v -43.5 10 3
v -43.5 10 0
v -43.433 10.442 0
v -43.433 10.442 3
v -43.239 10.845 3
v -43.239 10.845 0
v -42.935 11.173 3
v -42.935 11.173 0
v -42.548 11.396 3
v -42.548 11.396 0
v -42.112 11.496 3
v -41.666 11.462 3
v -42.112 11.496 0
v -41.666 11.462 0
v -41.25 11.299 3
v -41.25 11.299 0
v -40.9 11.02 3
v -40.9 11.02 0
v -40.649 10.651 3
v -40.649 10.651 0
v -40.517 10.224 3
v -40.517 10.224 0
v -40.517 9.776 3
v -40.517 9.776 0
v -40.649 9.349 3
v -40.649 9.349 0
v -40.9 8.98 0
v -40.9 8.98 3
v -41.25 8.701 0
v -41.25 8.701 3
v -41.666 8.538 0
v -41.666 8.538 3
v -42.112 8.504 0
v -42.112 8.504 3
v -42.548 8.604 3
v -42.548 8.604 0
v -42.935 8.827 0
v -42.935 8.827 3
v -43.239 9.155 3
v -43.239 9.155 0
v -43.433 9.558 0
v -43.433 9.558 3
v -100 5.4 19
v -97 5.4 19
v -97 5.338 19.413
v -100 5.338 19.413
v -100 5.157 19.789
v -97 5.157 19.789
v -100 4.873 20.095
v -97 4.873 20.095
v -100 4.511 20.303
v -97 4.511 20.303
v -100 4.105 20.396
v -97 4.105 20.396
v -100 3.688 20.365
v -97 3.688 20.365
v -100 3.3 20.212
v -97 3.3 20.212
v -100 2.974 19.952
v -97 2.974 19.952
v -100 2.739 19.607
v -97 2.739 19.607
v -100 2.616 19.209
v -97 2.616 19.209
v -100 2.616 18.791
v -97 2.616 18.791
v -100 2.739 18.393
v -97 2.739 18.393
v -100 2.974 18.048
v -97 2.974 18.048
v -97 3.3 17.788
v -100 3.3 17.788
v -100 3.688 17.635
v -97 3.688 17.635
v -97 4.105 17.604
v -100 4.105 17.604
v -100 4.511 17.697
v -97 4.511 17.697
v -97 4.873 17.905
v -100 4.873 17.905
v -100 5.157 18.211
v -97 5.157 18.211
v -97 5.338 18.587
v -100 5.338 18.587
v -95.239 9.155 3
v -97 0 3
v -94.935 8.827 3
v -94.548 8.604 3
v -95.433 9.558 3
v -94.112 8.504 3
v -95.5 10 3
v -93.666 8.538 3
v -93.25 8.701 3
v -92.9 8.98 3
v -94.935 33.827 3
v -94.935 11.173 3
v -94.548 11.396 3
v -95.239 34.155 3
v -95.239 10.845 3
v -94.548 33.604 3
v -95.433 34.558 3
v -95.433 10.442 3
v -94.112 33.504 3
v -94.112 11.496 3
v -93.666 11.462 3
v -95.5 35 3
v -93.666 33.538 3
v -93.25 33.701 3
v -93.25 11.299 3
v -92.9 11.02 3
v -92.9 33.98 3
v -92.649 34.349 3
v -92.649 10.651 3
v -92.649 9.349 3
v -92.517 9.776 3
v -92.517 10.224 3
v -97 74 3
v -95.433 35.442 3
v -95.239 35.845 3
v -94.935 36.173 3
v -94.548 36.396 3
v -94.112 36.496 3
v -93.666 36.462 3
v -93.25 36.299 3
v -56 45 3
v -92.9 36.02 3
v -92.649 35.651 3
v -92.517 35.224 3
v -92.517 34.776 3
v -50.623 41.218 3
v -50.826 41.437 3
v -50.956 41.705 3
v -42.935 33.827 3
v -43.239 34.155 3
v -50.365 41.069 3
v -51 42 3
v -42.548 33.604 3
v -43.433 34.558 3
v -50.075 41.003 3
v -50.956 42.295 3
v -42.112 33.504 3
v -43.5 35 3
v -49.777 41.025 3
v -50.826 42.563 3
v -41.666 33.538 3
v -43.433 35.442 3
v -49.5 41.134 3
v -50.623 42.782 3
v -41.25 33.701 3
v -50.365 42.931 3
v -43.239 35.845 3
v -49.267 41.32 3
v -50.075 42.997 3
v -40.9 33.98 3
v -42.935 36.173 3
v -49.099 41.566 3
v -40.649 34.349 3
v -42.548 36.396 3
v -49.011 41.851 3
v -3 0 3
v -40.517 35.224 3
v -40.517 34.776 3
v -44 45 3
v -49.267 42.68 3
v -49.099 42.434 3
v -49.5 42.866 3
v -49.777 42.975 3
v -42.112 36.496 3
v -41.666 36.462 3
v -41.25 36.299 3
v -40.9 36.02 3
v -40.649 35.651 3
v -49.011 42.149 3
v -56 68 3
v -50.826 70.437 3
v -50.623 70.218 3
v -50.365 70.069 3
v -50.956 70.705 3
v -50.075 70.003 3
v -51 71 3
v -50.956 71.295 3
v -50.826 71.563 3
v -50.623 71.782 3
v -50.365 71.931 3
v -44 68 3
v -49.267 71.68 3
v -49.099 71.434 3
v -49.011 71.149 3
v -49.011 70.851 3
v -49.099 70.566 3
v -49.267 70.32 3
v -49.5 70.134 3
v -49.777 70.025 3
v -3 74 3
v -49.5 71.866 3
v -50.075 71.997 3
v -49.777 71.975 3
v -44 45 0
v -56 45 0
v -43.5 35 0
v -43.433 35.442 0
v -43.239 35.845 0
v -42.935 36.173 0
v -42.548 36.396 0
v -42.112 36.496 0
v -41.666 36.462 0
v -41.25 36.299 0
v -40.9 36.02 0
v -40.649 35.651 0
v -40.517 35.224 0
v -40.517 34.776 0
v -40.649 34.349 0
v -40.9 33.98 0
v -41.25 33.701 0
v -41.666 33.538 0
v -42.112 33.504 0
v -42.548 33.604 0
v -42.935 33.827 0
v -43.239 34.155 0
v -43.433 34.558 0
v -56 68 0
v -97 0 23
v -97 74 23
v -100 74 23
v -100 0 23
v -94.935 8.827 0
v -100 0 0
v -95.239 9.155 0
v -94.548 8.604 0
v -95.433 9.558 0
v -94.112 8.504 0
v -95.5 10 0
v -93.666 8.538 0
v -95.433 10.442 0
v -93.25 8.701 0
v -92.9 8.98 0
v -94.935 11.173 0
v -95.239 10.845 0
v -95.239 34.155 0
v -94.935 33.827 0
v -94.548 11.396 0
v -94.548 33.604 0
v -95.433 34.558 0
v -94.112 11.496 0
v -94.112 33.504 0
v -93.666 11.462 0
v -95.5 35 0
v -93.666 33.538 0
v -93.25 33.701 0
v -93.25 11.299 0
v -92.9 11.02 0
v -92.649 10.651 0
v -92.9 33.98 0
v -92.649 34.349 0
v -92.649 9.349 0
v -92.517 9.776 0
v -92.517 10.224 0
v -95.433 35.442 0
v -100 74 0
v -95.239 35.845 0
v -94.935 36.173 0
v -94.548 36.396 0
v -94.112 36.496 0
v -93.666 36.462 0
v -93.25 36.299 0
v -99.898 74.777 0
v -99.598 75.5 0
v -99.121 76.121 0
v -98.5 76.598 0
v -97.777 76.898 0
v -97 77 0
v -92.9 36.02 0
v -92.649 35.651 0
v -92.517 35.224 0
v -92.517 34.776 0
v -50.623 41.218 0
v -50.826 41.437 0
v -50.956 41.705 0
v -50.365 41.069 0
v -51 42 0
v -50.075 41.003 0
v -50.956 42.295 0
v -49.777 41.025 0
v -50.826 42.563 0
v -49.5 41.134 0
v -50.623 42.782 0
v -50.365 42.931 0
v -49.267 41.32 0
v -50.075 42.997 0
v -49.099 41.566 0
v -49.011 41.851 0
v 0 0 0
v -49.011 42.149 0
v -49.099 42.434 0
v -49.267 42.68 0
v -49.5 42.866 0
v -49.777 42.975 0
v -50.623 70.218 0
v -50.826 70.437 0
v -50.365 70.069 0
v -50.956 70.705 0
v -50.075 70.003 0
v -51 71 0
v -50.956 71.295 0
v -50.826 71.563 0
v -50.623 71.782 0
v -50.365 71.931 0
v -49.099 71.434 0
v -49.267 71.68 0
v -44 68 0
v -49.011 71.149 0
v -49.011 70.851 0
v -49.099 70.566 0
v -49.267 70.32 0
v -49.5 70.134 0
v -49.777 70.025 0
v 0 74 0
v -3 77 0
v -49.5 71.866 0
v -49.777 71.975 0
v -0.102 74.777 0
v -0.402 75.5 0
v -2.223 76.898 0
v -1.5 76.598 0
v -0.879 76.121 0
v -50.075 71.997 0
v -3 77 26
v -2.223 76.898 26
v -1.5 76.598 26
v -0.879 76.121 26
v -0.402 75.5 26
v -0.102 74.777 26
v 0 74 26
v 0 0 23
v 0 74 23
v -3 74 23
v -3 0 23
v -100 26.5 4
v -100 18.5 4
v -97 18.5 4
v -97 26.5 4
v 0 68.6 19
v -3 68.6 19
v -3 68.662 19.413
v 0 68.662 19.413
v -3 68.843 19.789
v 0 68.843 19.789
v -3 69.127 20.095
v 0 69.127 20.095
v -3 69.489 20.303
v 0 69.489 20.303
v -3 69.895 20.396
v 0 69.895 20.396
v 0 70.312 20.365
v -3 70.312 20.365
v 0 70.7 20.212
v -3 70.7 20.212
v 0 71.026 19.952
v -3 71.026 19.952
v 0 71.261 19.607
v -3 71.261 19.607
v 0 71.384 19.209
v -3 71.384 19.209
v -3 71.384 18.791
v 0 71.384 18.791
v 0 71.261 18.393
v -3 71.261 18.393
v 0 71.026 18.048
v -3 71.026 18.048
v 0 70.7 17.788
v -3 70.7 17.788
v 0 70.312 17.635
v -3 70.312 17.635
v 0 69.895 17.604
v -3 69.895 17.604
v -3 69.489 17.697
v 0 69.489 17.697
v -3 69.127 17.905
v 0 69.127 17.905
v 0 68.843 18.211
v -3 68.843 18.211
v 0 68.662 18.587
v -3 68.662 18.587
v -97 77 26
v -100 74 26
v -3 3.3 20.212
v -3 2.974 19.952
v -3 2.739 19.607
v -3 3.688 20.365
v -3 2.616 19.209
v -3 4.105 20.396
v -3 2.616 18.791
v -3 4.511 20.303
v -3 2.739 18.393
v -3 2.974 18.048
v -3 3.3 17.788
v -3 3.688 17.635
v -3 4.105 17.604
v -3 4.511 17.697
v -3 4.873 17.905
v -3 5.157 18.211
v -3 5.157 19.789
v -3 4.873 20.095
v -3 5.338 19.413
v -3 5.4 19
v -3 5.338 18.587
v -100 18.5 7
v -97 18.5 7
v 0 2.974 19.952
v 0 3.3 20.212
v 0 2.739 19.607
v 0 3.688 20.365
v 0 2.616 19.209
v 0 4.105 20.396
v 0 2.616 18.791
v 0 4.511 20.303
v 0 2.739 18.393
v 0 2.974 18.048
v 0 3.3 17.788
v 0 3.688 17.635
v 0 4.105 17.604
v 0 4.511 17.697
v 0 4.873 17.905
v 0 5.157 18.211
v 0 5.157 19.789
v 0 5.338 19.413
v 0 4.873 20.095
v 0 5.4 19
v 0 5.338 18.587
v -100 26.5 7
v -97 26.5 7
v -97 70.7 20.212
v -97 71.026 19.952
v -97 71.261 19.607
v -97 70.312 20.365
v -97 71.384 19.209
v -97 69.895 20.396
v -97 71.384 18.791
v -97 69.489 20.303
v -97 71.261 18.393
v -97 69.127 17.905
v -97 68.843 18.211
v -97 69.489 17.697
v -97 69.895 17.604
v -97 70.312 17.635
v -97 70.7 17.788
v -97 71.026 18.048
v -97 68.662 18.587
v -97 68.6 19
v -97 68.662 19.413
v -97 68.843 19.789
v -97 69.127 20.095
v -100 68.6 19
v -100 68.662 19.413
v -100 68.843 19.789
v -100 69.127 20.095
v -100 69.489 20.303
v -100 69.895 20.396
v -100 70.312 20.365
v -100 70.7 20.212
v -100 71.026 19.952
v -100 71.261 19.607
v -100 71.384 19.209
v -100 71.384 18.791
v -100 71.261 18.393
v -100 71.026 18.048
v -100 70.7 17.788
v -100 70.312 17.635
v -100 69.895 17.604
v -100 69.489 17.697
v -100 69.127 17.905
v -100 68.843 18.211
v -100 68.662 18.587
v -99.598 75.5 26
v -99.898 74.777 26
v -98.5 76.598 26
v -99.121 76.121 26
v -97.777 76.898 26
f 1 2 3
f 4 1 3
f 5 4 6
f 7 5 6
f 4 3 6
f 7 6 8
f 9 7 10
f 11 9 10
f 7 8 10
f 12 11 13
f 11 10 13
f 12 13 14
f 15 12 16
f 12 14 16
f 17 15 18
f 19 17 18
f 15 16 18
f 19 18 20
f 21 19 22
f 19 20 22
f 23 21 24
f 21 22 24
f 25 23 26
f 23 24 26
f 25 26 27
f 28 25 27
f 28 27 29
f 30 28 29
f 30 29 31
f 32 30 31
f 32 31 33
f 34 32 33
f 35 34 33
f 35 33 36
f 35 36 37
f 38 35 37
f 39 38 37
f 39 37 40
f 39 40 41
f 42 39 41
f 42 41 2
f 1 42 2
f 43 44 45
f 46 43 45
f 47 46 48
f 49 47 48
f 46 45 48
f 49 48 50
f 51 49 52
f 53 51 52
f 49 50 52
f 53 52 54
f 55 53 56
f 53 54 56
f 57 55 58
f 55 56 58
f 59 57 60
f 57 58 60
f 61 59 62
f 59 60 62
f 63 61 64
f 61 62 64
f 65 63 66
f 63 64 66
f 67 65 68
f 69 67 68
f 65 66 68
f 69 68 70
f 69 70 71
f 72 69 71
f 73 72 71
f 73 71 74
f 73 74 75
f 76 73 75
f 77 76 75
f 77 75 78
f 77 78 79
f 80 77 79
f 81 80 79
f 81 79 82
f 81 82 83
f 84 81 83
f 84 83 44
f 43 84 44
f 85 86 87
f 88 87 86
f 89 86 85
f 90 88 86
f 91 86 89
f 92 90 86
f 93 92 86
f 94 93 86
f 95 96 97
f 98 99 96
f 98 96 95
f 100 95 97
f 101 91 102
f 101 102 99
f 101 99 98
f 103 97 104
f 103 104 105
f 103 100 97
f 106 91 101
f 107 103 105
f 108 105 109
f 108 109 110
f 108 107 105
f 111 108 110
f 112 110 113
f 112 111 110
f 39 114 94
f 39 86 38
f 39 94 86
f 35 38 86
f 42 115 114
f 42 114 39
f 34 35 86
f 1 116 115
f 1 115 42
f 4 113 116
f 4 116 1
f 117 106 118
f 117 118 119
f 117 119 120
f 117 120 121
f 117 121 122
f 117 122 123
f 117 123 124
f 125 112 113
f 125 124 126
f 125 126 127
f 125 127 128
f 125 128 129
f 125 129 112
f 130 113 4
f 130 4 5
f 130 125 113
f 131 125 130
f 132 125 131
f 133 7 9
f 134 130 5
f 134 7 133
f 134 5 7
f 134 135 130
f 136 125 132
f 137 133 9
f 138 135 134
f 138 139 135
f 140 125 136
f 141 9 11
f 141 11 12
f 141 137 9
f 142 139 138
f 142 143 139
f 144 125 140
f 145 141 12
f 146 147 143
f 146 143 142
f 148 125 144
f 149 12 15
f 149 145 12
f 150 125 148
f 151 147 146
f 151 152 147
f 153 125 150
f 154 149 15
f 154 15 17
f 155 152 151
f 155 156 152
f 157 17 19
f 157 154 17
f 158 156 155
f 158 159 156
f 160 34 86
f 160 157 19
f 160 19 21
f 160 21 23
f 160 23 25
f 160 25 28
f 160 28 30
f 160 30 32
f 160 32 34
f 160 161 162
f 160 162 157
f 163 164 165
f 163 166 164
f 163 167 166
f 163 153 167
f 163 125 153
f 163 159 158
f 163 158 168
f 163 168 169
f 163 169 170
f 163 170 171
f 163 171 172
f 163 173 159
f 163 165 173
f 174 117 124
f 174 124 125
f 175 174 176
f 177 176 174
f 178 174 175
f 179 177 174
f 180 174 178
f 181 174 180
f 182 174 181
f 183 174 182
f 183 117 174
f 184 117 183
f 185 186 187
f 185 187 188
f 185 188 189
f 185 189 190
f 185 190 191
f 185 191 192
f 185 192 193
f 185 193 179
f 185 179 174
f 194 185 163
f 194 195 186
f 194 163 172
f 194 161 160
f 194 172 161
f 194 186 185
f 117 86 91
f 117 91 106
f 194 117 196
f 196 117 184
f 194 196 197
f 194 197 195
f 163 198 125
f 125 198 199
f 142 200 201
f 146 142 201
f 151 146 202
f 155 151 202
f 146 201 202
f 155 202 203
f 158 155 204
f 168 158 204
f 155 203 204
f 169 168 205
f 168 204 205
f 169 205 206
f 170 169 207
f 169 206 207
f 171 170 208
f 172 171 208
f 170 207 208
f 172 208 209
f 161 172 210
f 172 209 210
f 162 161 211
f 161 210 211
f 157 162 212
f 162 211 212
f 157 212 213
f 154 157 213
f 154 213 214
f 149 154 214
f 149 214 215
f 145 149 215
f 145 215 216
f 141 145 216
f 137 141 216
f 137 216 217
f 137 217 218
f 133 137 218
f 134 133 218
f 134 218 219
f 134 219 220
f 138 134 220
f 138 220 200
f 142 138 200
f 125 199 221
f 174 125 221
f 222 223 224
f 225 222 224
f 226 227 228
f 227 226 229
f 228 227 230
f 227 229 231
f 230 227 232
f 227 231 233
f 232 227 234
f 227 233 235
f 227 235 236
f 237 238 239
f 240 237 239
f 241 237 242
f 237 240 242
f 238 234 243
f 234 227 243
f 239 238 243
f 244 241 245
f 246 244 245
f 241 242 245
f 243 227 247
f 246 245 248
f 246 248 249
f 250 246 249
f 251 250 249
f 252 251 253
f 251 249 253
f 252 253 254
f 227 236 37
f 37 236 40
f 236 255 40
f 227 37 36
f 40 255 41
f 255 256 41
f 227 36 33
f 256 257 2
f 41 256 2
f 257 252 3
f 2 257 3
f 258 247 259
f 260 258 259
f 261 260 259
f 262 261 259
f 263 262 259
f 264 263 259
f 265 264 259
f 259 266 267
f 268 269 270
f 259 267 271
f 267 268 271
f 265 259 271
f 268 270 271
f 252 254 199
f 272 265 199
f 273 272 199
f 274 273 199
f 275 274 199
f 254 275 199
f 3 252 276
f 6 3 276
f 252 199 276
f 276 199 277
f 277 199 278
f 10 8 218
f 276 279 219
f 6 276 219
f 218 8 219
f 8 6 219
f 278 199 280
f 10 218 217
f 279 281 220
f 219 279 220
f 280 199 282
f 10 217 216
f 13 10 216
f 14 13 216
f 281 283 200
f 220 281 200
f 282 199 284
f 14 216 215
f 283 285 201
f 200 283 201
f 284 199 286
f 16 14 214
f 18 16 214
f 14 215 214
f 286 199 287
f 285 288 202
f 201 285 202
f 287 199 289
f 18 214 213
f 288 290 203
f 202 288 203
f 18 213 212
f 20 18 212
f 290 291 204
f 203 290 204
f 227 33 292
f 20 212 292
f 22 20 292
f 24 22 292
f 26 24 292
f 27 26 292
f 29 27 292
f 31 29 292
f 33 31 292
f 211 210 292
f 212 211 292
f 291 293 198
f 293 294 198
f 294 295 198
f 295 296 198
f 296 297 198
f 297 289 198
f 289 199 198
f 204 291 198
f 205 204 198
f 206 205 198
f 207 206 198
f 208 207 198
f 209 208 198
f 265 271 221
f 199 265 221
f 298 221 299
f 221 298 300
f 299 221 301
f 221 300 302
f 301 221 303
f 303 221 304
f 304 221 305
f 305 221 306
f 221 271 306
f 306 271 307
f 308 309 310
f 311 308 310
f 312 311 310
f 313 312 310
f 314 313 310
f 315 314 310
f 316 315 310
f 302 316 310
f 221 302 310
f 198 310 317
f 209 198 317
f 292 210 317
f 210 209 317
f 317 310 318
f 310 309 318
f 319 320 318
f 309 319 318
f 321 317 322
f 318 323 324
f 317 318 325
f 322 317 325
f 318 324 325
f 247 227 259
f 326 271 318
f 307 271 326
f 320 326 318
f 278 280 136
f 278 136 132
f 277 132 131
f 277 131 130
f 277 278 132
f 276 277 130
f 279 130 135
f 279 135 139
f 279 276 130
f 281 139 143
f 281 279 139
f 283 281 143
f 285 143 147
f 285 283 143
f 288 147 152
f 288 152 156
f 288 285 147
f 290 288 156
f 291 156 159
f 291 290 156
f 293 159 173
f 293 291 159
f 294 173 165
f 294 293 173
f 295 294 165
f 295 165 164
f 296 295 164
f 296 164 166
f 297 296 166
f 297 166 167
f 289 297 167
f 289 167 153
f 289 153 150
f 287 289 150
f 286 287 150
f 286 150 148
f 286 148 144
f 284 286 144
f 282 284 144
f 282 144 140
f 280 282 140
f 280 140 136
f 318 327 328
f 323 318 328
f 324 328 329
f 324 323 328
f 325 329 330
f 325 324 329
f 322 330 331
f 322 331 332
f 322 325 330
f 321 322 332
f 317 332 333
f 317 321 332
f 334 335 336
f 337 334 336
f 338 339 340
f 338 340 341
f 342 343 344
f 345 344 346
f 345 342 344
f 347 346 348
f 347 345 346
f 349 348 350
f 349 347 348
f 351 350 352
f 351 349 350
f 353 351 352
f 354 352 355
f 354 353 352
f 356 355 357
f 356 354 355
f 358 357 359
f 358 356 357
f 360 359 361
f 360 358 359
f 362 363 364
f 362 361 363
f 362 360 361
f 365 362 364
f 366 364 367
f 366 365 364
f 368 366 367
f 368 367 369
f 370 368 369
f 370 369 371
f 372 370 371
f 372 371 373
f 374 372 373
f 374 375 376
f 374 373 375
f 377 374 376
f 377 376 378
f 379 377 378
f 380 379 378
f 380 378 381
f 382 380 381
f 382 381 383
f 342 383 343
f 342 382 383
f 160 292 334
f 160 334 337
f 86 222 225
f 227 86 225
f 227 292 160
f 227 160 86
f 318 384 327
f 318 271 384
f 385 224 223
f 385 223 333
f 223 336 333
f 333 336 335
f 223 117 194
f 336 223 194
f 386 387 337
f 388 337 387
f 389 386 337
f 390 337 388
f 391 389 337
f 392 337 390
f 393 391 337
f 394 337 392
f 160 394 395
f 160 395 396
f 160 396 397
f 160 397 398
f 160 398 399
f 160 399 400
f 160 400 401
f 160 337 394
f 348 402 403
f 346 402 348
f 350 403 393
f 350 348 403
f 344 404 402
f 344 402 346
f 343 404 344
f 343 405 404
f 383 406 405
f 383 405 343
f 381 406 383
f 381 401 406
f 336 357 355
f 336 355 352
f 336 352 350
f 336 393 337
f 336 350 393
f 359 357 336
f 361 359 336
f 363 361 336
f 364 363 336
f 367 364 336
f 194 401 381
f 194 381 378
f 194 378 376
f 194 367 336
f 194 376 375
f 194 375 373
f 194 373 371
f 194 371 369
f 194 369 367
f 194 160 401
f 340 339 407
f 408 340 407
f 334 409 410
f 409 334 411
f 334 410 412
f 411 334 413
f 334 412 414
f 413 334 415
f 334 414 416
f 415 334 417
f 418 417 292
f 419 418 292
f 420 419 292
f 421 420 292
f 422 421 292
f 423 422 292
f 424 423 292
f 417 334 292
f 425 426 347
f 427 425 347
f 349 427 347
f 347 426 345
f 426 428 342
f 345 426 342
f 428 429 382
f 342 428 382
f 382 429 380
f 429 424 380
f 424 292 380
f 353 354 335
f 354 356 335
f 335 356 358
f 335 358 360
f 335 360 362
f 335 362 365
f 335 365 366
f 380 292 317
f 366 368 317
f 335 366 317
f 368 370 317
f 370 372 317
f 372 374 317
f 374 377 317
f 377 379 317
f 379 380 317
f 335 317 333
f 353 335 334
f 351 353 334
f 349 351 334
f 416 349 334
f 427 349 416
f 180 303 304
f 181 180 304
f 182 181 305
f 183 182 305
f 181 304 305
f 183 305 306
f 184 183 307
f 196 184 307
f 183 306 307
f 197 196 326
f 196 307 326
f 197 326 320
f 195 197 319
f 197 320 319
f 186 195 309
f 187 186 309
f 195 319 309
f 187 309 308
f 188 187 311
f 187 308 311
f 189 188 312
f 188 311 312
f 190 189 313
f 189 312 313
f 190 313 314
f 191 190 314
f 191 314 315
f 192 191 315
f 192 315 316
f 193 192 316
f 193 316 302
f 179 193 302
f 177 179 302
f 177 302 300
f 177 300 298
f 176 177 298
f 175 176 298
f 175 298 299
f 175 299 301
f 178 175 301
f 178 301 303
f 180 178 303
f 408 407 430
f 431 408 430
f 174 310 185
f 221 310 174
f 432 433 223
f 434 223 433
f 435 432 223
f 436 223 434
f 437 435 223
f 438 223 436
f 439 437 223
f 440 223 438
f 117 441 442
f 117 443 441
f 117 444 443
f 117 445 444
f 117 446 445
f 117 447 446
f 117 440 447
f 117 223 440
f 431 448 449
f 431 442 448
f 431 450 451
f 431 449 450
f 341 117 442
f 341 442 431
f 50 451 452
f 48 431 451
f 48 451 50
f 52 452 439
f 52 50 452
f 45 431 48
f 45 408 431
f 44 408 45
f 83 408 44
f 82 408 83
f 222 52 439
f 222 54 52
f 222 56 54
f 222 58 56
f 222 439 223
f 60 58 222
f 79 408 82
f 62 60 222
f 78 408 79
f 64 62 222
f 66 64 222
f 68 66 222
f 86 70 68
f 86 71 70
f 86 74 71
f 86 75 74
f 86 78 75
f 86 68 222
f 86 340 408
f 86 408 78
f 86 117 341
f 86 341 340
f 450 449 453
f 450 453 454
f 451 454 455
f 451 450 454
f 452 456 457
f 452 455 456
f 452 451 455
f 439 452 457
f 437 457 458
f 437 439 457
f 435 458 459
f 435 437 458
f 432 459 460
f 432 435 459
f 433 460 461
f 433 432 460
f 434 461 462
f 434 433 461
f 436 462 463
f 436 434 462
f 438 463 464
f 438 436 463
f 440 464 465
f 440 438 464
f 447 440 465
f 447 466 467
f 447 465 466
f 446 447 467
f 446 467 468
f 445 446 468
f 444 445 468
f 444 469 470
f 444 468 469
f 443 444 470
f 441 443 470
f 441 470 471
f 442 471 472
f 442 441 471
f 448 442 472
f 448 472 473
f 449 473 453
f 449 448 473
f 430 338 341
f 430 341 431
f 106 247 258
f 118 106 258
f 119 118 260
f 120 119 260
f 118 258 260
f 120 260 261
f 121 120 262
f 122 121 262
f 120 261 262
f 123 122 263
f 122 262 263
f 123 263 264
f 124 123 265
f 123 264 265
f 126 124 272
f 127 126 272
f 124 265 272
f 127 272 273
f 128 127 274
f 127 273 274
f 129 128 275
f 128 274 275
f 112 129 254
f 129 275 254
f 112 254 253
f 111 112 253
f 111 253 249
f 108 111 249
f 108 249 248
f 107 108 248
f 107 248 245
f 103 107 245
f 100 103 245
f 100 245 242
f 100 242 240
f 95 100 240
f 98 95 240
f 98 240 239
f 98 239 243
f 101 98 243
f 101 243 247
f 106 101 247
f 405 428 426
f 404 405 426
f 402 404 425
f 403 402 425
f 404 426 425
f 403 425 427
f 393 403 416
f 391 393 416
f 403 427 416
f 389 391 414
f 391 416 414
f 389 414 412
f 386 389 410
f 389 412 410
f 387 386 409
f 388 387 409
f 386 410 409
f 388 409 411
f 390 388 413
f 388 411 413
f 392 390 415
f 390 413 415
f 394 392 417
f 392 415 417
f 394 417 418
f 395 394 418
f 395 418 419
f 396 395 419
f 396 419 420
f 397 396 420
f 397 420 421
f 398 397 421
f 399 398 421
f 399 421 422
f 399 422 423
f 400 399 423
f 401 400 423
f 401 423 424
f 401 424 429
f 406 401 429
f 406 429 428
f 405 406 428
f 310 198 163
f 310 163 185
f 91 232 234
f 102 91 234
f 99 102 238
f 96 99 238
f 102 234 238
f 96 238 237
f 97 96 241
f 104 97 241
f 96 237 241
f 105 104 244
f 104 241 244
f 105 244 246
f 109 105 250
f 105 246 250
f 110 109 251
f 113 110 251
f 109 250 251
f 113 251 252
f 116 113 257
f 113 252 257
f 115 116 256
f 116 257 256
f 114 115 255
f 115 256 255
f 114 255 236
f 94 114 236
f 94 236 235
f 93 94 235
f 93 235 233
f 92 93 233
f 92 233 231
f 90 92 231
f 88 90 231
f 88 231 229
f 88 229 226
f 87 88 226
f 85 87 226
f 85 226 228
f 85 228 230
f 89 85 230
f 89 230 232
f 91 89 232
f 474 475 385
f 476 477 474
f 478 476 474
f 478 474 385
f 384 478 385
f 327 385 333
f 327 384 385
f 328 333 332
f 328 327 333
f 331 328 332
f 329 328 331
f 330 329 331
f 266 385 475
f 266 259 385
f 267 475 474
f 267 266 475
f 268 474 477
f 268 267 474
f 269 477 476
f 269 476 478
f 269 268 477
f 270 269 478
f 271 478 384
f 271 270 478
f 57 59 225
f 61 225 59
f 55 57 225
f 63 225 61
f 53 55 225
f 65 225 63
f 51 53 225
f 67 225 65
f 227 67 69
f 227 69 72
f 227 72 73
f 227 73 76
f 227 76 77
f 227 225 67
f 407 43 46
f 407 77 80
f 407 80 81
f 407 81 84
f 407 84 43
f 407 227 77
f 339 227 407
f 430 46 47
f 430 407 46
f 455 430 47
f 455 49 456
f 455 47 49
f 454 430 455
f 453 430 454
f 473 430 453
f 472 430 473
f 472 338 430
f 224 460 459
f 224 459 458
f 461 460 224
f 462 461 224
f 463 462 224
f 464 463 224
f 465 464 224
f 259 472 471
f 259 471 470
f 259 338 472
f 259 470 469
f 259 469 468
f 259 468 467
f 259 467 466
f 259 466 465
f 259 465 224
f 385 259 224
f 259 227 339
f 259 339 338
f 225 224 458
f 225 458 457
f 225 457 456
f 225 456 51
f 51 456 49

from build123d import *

# Parameters (mm, degrees)
SKETCH1_W            = 100
SKETCH1_H            = 77
BOSS_EXTRUDE1_DEPTH  = 3
BOSS_EXTRUDE2_DEPTH  = 20
SKETCH3_W            = 100
SKETCH3_H            = 3
BOSS_EXTRUDE3_DEPTH  = 3
SKETCH4_W            = 12
SKETCH4_H            = 23
CUT_EXTRUDE1_DEPTH   = 3
SKETCH5_R            = 1.5
CUT_EXTRUDE2_DEPTH   = 129.860389569
LPATTERN1_COUNT      = 2
LPATTERN1_PITCH      = 25
LPATTERN1_COUNT_DIR2 = 2
LPATTERN1_PITCH_DIR2 = 52
SKETCH6_R            = 1.4
CUT_EXTRUDE3_DEPTH   = 129.860389569
CUT_EXTRUDE4_REACH   = 130.86
SKETCH7_W            = 3
SKETCH7_H            = 8
CUT_EXTRUDE5_REACH   = 130.86
SKETCH9_R            = 1
FILLET1_R            = 3


with BuildPart() as part:
    # Sketch1 → Boss-Extrude1 (new body)
    with BuildSketch(Plane.XY):
        with Locations((-50, 38.5)):
            Rectangle(SKETCH1_W, SKETCH1_H)
    extrude(amount=BOSS_EXTRUDE1_DEPTH)

    # Sketch2 → Boss-Extrude2 (add)
    with BuildSketch(Plane.XY.offset(3)):
        Polygon((-100, 77), (-97, 77), (-3, 77), (0, 77), (0, 0), (-3, 0), (-3, 74), (-97, 74), (-97, 0), (-100, 0), align=None)
    extrude(amount=BOSS_EXTRUDE2_DEPTH)

    # Sketch3 → Boss-Extrude3 (add)
    with BuildSketch(Plane.XY.offset(23)):
        with Locations((-50, 75.5)):
            Rectangle(SKETCH3_W, SKETCH3_H)
    extrude(amount=BOSS_EXTRUDE3_DEPTH)

    # Sketch4 → Cut-Extrude1 (cut)
    with BuildSketch(Plane(origin=(0, 0, 0), x_dir=(-1, 0, 0), z_dir=(0, 0, -1))):
        with Locations((50, 56.5)):
            Rectangle(SKETCH4_W, SKETCH4_H)
    extrude(amount=-CUT_EXTRUDE1_DEPTH, mode=Mode.SUBTRACT)

    # Sketch5 → Cut-Extrude2 (cut, through all)
    with BuildSketch(Plane(origin=(0, 0, 0), x_dir=(-1, 0, 0), z_dir=(0, 0, -1))):
        with Locations((94, 10)):
            Circle(SKETCH5_R)
    cut_extrude2 = extrude(amount=-CUT_EXTRUDE2_DEPTH, mode=Mode.SUBTRACT)

    # LPattern1: Cut-Extrude2 2 × 2
    with Locations(*[(j * LPATTERN1_PITCH_DIR2, i * LPATTERN1_PITCH, 0) for i in range(LPATTERN1_COUNT) for j in range(LPATTERN1_COUNT_DIR2) if (i, j) != (0, 0)]):
        add(cut_extrude2, mode=Mode.SUBTRACT)

    # Sketch6 → Cut-Extrude3 (cut, through all)
    with BuildSketch(Plane(origin=(0, 0, 0), x_dir=(0, 0, -1), z_dir=(1, 0, 0))):
        with Locations(Location((-19, 4, 0), (0, 0, 90))):
            Circle(SKETCH6_R)
    cut_extrude3 = extrude(amount=-CUT_EXTRUDE3_DEPTH, mode=Mode.SUBTRACT)

    # Sketch7 → Cut-Extrude4 (cut, up to next)
    with BuildSketch(Plane.ZY.offset(100), mode=Mode.PRIVATE) as cut_extrude4_sk1:
        with Locations((5.5, 22.5)):
            Rectangle(SKETCH7_W, SKETCH7_H)
    cut_extrude4_tool1 = extrude(cut_extrude4_sk1.sketch, amount=-CUT_EXTRUDE4_REACH, mode=Mode.PRIVATE) & part.part
    add(cut_extrude4_tool1.solids().sort_by_distance((-100, 22.5, 5.5))[0], mode=Mode.SUBTRACT)

    # Sketch9 → Cut-Extrude5 (cut, up to next)
    with BuildSketch(Plane(origin=(0, 0, 0), x_dir=(-1, 0, 0), z_dir=(0, 0, -1)), mode=Mode.PRIVATE) as cut_extrude5_sk1:
        with Locations((50, 71)):
            Circle(SKETCH9_R)
    cut_extrude5_tool1 = extrude(cut_extrude5_sk1.sketch, amount=-CUT_EXTRUDE5_REACH, mode=Mode.PRIVATE) & part.part
    cut_extrude5 = cut_extrude5_tool1.solids().sort_by_distance((-50, 71, 0))[0]
    add(cut_extrude5, mode=Mode.SUBTRACT)

    # Mirror1: Cut-Extrude5 across plane
    add(cut_extrude5.mirror(Plane(origin=(0, 56.5, 0), x_dir=(0, 0, 1), z_dir=(0, -1, 0))), mode=Mode.SUBTRACT)

    # Mirror2: Cut-Extrude3 across plane
    add(cut_extrude3.mirror(Plane(origin=(0, 37, 0), x_dir=(0, 0, 1), z_dir=(0, -1, 0))), mode=Mode.SUBTRACT)

    # Fillet1
    fillet1_edges = [part.edges().sort_by_distance(p)[0] for p in [
        (0, 77, 13),
        (-100, 77, 13),
    ]]
    fillet(fillet1_edges, radius=FILLET1_R - 0.0001)  # a hair under: the kernel refuses the full size


solid = part.part
